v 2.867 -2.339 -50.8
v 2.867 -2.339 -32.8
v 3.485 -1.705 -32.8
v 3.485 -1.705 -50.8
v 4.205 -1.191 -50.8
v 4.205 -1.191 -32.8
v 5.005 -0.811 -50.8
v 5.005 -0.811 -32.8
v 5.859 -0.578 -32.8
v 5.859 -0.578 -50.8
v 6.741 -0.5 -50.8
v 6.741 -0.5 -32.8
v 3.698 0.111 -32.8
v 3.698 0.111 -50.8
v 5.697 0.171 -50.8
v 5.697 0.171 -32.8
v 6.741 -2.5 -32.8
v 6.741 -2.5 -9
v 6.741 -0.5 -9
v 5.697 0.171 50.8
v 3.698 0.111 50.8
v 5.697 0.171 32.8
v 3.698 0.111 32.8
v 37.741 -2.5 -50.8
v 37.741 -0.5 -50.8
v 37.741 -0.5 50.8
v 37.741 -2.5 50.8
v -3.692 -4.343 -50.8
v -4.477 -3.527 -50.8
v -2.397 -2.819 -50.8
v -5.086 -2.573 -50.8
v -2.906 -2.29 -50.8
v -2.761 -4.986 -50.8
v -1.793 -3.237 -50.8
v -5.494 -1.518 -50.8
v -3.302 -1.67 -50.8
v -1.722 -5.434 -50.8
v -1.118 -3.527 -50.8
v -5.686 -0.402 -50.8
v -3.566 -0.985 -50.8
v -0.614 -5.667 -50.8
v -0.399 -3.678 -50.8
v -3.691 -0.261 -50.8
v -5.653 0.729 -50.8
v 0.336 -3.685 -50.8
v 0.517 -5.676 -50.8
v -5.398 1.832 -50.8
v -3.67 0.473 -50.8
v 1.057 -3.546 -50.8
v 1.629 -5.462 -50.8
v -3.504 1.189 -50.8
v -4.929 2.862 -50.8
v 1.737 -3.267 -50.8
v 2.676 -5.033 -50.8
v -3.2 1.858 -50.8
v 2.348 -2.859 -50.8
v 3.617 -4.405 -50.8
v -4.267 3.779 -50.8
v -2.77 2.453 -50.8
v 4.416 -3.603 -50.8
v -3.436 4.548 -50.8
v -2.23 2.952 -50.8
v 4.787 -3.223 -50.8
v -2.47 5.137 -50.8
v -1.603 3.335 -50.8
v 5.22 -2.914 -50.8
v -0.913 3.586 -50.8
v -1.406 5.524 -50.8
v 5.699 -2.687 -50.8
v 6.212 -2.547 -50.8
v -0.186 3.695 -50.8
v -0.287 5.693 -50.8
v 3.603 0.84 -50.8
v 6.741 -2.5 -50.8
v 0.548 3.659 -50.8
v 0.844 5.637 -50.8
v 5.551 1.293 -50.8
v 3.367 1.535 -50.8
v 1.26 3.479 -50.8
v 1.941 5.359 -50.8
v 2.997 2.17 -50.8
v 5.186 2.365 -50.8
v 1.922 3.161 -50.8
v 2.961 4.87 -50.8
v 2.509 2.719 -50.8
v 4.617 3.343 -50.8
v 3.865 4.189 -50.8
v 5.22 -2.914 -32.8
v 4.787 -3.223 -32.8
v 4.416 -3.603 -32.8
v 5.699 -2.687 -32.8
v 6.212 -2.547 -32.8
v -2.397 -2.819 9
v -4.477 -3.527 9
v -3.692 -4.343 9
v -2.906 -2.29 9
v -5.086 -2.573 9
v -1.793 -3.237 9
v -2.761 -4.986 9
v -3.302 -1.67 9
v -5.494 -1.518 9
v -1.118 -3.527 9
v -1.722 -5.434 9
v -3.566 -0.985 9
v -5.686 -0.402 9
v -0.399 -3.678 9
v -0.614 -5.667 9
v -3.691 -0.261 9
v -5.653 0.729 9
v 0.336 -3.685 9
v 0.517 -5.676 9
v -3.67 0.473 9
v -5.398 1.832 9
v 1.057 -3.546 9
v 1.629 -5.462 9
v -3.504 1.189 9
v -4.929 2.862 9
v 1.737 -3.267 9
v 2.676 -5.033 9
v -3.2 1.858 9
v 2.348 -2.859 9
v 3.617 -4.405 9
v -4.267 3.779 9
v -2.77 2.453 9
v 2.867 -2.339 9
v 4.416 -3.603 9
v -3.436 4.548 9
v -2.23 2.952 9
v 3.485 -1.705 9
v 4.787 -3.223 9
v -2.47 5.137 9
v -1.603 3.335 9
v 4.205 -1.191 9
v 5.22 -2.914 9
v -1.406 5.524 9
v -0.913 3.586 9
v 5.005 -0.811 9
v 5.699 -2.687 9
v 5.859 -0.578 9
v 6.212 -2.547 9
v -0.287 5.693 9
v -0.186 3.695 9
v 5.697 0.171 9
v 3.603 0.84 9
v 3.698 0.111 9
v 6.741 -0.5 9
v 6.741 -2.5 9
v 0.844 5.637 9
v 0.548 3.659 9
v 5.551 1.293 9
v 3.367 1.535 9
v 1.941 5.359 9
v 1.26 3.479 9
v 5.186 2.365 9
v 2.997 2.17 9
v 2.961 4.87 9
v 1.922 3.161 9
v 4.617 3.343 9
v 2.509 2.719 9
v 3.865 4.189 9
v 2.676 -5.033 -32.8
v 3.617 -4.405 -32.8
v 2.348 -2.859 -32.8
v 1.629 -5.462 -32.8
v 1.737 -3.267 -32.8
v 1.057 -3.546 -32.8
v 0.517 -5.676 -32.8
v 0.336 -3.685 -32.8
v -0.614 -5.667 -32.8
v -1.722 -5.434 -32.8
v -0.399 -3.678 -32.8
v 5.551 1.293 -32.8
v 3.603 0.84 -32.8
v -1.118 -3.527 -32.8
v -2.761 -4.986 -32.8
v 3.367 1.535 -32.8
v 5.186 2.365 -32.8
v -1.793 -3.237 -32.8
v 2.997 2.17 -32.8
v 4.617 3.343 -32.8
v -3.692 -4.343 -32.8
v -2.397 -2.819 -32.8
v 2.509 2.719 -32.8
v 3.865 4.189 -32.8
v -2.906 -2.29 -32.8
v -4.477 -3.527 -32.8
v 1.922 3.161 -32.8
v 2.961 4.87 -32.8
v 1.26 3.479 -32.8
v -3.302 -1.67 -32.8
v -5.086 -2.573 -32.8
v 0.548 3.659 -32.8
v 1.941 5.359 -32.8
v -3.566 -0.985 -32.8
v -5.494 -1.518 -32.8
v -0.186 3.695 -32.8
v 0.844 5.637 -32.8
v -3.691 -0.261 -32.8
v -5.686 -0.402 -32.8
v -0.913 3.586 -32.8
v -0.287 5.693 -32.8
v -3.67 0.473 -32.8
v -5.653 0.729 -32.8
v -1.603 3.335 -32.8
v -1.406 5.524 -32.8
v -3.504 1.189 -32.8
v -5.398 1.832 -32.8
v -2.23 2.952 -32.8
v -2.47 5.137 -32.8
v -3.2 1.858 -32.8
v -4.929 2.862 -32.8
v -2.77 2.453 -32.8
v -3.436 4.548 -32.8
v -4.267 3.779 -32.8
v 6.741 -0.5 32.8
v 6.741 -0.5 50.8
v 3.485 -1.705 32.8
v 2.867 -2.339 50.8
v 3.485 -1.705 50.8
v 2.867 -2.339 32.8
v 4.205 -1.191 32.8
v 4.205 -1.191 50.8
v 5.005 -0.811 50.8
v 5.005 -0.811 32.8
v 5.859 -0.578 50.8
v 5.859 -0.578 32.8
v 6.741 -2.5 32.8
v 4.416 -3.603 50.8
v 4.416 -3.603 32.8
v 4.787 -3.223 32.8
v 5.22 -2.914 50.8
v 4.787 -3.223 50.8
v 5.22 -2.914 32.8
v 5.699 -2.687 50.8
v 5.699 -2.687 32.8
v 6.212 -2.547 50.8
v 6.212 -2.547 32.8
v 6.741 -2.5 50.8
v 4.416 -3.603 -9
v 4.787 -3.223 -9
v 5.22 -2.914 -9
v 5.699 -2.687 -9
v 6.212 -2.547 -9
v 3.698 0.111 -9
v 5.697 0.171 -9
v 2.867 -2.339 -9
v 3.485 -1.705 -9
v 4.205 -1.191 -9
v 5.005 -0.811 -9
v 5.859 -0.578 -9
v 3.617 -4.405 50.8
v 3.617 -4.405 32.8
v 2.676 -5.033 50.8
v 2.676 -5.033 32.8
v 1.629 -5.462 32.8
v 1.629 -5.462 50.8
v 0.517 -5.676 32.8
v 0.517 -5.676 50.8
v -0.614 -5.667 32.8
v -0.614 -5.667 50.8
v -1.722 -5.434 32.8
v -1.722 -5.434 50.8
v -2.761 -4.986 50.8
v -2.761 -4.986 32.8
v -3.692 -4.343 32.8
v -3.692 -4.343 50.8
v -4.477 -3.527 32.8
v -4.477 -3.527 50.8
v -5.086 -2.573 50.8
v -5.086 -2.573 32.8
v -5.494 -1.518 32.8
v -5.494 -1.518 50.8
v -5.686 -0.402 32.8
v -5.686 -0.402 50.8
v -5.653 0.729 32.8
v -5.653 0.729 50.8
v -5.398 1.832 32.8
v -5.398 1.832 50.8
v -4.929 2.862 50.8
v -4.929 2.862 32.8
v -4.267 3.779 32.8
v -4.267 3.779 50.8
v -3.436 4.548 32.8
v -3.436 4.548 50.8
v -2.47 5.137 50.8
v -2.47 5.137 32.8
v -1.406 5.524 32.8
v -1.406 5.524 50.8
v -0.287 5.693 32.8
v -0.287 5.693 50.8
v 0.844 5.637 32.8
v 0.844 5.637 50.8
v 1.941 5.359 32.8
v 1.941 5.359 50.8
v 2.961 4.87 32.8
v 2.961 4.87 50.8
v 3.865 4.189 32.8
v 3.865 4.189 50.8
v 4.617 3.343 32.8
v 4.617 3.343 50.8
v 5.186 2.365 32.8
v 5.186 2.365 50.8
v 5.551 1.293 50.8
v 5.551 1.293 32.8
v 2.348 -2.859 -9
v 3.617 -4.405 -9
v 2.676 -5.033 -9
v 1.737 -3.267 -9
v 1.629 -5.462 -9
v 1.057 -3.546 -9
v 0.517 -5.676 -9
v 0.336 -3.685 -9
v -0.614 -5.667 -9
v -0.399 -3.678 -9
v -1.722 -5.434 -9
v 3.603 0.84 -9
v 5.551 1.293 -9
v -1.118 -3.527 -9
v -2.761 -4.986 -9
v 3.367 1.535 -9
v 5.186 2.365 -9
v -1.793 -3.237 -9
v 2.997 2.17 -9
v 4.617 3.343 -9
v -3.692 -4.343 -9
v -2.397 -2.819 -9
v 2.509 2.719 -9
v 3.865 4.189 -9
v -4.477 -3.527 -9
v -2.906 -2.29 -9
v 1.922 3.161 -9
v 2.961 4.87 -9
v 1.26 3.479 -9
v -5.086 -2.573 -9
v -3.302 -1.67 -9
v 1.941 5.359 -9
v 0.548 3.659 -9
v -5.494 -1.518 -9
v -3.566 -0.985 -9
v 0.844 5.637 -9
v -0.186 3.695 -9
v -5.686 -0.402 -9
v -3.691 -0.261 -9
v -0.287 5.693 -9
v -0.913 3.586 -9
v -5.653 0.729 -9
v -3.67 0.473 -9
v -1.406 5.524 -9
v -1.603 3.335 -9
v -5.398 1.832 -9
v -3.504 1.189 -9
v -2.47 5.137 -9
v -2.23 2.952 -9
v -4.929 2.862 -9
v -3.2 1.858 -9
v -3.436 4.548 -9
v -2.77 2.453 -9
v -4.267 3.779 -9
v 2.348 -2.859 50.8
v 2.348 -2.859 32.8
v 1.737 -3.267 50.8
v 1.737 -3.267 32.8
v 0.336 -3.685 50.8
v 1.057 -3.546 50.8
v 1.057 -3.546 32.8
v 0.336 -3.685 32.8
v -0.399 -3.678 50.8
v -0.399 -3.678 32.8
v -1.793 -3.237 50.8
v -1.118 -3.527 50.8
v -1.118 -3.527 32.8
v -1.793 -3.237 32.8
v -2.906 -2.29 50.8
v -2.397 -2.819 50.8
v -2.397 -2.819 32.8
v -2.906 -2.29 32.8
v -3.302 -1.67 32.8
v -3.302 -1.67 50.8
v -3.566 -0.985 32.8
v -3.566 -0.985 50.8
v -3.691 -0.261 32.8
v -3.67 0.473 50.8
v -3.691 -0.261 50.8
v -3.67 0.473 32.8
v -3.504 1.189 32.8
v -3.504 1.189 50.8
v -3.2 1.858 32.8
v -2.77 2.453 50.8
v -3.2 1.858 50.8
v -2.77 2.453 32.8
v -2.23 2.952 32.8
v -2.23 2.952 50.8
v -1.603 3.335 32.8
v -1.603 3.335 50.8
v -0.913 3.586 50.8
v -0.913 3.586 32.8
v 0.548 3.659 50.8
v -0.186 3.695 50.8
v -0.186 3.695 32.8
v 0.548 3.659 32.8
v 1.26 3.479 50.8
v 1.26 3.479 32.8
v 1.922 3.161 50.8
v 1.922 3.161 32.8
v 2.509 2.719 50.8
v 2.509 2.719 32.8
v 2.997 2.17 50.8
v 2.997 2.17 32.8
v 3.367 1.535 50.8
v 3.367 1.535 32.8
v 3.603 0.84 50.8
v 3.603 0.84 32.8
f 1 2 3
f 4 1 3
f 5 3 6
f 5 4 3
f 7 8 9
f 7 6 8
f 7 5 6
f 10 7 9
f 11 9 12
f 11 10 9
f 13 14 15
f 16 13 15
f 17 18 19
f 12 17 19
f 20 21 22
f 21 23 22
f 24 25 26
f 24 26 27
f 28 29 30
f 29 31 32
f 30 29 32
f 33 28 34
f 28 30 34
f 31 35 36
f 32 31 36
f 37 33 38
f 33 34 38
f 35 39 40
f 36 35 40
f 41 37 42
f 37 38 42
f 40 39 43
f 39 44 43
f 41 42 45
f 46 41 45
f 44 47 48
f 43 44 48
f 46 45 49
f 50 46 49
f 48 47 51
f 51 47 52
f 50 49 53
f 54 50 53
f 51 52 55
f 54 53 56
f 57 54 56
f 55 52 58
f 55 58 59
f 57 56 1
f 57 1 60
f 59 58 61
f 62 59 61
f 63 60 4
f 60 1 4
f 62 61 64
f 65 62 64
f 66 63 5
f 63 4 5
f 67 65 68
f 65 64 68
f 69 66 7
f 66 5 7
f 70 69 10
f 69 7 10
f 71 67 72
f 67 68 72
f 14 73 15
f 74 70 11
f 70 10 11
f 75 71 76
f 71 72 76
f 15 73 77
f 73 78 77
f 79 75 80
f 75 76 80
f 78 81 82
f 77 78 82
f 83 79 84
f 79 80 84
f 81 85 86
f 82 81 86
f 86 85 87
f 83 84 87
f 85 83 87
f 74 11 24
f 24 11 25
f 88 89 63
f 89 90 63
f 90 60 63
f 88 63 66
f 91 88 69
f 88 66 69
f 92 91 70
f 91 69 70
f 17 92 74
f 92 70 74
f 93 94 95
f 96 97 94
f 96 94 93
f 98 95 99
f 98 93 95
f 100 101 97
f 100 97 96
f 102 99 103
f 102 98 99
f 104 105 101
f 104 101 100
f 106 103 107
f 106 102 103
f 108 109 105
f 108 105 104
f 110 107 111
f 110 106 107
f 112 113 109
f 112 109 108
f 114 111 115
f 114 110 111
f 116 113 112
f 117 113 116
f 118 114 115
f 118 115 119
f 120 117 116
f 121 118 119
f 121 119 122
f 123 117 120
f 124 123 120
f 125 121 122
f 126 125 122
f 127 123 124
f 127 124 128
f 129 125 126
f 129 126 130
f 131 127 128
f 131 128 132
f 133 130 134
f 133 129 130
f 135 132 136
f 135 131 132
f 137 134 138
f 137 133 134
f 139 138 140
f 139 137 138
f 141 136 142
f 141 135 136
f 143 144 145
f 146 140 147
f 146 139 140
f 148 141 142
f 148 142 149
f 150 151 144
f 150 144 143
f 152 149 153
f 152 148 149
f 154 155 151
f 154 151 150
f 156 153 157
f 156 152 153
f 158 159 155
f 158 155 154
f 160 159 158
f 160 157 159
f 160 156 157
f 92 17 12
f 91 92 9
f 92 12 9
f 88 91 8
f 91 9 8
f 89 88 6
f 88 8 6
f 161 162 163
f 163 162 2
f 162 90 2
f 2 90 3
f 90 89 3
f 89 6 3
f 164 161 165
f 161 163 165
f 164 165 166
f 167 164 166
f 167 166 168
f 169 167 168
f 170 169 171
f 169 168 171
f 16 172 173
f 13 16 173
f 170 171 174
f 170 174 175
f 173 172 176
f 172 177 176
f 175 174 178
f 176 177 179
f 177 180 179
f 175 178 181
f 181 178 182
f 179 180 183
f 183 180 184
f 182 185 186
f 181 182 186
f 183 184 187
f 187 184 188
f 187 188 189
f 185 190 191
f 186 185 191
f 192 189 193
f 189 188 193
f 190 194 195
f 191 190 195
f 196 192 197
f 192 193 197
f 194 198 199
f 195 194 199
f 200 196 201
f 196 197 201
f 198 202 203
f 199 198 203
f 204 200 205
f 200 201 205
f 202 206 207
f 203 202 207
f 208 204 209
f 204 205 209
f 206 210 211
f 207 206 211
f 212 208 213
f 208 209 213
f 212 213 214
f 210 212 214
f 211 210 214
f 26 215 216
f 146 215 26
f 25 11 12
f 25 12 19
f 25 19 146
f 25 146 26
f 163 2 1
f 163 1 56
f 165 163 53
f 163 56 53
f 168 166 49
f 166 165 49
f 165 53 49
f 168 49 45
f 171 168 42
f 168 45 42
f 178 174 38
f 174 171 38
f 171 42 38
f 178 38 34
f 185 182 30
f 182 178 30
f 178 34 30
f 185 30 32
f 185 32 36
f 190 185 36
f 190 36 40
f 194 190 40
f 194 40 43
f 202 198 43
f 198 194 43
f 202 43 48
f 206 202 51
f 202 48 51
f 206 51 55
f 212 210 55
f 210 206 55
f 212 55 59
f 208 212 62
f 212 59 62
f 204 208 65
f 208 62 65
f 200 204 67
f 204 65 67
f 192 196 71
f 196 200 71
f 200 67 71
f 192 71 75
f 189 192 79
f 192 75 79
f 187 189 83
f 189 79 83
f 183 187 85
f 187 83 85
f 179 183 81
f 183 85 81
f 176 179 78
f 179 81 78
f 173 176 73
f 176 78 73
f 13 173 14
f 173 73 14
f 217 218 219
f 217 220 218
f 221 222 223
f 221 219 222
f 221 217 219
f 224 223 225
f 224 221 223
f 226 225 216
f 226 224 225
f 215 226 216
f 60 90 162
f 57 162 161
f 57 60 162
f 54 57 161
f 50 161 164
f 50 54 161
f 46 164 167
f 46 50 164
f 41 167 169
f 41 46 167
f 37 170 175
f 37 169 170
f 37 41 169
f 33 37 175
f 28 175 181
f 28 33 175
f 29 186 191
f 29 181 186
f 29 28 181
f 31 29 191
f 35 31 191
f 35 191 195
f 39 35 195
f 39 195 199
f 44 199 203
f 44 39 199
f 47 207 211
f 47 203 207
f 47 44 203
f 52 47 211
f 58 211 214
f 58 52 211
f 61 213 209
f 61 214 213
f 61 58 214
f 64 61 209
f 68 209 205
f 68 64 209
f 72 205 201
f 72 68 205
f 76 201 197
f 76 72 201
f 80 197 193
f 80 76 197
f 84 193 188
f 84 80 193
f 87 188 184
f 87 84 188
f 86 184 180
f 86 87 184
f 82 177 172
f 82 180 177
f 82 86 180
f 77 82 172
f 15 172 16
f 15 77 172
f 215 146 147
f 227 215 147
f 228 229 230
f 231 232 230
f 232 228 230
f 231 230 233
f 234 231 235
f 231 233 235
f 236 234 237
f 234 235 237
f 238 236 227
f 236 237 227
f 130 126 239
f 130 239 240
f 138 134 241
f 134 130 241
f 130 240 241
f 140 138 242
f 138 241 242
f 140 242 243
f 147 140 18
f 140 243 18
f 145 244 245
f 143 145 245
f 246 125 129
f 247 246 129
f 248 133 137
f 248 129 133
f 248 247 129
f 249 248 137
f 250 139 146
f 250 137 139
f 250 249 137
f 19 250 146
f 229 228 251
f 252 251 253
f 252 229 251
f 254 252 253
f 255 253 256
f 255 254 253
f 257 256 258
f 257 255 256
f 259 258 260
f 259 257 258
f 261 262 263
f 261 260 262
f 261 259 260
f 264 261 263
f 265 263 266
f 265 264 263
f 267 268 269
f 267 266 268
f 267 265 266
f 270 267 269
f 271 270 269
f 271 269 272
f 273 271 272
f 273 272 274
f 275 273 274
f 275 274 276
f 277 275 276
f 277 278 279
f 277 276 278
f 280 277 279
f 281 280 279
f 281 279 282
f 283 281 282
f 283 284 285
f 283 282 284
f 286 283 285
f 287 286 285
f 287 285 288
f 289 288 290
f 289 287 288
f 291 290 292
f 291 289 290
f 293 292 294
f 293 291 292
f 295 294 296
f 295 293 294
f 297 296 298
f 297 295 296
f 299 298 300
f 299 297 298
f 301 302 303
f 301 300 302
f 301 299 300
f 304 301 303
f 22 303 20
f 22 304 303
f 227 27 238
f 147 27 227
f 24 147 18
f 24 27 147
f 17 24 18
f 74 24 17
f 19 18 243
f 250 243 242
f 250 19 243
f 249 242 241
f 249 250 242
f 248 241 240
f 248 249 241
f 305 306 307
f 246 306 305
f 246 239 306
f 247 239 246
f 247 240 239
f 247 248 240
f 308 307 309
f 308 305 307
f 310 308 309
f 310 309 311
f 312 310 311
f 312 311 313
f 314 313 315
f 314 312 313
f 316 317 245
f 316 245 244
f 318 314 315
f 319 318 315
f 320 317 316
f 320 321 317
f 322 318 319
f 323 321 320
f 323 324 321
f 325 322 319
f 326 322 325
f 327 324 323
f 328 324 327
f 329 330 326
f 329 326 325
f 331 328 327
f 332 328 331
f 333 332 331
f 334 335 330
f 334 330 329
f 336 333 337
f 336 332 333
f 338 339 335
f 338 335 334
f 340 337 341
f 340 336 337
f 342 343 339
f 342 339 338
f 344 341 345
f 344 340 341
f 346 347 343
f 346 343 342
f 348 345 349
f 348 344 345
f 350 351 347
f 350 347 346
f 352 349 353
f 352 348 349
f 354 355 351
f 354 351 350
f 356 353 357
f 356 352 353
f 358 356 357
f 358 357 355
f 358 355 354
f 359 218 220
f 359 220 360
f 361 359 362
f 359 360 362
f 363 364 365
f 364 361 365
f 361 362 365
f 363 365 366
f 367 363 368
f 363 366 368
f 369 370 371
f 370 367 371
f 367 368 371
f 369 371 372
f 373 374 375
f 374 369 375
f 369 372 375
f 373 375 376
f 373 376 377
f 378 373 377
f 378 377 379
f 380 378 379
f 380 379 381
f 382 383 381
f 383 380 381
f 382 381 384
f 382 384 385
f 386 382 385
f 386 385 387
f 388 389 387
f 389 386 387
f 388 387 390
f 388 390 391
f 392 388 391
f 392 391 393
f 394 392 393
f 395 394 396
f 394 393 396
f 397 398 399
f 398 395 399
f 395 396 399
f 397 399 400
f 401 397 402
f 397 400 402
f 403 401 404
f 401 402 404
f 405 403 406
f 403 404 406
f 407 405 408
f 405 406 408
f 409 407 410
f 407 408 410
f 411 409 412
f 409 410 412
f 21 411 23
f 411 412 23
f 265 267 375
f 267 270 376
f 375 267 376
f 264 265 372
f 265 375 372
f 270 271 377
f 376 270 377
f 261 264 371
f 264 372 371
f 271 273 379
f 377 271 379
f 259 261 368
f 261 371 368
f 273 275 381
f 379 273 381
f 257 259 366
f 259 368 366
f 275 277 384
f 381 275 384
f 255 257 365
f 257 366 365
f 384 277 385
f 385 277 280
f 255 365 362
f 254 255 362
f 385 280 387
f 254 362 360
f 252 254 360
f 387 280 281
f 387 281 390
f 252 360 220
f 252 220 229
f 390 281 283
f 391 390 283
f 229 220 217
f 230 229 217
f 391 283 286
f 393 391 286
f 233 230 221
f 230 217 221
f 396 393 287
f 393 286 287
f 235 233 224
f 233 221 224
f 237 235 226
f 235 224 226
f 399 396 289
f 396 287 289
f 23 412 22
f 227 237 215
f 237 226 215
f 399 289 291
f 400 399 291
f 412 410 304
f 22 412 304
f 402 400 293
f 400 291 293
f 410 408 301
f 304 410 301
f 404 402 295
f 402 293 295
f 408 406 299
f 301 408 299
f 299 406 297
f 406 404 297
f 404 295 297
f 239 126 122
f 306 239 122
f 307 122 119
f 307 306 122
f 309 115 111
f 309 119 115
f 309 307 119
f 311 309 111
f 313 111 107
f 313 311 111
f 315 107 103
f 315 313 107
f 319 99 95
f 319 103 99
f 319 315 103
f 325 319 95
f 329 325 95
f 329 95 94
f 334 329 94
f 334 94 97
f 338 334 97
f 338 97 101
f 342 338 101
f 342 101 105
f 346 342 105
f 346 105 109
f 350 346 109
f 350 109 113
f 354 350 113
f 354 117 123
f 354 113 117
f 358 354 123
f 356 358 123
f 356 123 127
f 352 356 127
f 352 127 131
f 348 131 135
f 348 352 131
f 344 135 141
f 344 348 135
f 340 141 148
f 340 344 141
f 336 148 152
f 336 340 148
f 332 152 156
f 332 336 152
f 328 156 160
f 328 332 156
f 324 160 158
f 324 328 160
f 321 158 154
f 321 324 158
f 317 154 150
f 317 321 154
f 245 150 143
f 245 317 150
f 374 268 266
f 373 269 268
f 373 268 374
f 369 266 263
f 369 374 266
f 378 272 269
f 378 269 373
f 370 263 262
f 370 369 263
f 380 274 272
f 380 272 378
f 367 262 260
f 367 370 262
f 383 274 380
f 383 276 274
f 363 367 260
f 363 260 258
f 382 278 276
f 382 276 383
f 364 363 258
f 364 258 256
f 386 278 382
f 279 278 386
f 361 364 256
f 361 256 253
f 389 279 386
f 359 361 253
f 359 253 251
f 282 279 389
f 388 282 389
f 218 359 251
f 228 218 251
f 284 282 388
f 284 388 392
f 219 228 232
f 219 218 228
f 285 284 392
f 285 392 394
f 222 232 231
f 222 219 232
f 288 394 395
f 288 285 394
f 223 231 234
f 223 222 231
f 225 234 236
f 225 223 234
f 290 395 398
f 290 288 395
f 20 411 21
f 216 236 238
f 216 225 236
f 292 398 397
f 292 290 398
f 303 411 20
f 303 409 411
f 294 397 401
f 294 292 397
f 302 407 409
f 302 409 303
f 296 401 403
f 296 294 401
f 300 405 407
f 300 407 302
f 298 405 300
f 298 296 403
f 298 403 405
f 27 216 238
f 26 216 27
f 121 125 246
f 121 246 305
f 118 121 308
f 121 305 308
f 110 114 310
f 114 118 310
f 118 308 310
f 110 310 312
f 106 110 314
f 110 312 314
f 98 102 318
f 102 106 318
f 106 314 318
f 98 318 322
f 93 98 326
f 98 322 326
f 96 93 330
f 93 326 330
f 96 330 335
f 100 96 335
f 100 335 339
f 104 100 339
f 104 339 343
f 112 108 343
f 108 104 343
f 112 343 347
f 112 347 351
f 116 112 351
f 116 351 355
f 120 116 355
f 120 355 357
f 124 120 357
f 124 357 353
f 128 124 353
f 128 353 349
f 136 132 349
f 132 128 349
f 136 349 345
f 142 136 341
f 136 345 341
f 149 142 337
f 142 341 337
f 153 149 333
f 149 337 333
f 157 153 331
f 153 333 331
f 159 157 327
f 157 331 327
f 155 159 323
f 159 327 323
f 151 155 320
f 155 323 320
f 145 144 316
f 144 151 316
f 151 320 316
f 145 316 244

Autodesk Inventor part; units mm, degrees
ref_plane "YZ Plane" through (0, 0, 0) normal (1, 0, 0) x (0, 1, 0)
ref_plane "XZ Plane" through (0, 0, 0) normal (0, 1, 0) x (-1, 0, 0)
sketch "Sketch1" plane through (0, 0, 0) normal (0, 0, 1) x (1, 0, 0)
  arc A0 (5.6974, 0.1712) -> (4.4165, -3.6034) centre (0, 0) ccw
  line L0 (37.7409, -2.5) -> (6.7409, -2.5)
  arc A1 (3.6983, 0.1111) -> (2.8668, -2.3391) centre (0, 0) ccw
  line L1 (6.7409, -0.5) -> (37.7409, -0.5)
  line L2 (37.7409, -0.5) -> (37.7409, -2.5)
  arc A2 (6.7409, -2.5) -> (4.4165, -3.6034) centre (6.7409, -5.5) ccw
  arc A3 (6.7409, -0.5) -> (2.8668, -2.3391) centre (6.7409, -5.5) ccw
  line L3 (3.6983, 0.1111) -> (5.6974, 0.1712)
  point P0 (5.1225, -2.5)
  dimension "d0" = 11.4
  dimension "d1" = 2
  dimension "d2" = 3
  dimension "d3" = 5
  dimension "d4" = 2
  dimension "d5" = 31
  dimension "d8" = 0.5
  dimension "d9" = 0.7
extrude "Extrusion1" add sketch "Sketch1" along normal mid plane 101.6
ref_plane "Work Plane1" through (0, 0, 32.8) normal (0, 0, 1) x (1, 0, 0)
sketch "Sketch2" plane through (0, 0, 32.8) normal (0, 0, 1) x (1, 0, 0)
  arc A0 (6.7409, -2.5) -> (4.4165, -3.6034) centre (6.7409, -5.5) ccw projected
  arc A1 (5.6974, 0.1712) -> (4.4165, -3.6034) centre (0, 0) ccw projected
  line L0 (5.6974, 0.1712) -> (3.6983, 0.1111) projected
  arc A2 (3.6983, 0.1111) -> (2.8668, -2.3391) centre (0, 0) ccw projected
  arc A3 (6.7409, -0.5) -> (2.8668, -2.3391) centre (6.7409, -5.5) ccw projected
  line L1 (6.7409, -0.5) -> (37.7409, -0.5) construction
  line L2 (37.7409, -0.5) -> (37.7409, -2.5) construction
  line L3 (37.7409, -2.5) -> (6.7409, -2.5) construction
  line L4 (6.7409, -0.5) -> (6.7409, -2.5)
extrude "Extrusion2" cut sketch "Sketch2" against normal blind 23.8
mirror "Mirror1" about plane through (0, 0, 0) normal (0, 0, 1) of "Extrusion2"
equation "\"d1\" = d4"
equation "\"d3\" = d2 + d4"
properties part number "HINGE PLATE 1" material "Stainless Steel"
